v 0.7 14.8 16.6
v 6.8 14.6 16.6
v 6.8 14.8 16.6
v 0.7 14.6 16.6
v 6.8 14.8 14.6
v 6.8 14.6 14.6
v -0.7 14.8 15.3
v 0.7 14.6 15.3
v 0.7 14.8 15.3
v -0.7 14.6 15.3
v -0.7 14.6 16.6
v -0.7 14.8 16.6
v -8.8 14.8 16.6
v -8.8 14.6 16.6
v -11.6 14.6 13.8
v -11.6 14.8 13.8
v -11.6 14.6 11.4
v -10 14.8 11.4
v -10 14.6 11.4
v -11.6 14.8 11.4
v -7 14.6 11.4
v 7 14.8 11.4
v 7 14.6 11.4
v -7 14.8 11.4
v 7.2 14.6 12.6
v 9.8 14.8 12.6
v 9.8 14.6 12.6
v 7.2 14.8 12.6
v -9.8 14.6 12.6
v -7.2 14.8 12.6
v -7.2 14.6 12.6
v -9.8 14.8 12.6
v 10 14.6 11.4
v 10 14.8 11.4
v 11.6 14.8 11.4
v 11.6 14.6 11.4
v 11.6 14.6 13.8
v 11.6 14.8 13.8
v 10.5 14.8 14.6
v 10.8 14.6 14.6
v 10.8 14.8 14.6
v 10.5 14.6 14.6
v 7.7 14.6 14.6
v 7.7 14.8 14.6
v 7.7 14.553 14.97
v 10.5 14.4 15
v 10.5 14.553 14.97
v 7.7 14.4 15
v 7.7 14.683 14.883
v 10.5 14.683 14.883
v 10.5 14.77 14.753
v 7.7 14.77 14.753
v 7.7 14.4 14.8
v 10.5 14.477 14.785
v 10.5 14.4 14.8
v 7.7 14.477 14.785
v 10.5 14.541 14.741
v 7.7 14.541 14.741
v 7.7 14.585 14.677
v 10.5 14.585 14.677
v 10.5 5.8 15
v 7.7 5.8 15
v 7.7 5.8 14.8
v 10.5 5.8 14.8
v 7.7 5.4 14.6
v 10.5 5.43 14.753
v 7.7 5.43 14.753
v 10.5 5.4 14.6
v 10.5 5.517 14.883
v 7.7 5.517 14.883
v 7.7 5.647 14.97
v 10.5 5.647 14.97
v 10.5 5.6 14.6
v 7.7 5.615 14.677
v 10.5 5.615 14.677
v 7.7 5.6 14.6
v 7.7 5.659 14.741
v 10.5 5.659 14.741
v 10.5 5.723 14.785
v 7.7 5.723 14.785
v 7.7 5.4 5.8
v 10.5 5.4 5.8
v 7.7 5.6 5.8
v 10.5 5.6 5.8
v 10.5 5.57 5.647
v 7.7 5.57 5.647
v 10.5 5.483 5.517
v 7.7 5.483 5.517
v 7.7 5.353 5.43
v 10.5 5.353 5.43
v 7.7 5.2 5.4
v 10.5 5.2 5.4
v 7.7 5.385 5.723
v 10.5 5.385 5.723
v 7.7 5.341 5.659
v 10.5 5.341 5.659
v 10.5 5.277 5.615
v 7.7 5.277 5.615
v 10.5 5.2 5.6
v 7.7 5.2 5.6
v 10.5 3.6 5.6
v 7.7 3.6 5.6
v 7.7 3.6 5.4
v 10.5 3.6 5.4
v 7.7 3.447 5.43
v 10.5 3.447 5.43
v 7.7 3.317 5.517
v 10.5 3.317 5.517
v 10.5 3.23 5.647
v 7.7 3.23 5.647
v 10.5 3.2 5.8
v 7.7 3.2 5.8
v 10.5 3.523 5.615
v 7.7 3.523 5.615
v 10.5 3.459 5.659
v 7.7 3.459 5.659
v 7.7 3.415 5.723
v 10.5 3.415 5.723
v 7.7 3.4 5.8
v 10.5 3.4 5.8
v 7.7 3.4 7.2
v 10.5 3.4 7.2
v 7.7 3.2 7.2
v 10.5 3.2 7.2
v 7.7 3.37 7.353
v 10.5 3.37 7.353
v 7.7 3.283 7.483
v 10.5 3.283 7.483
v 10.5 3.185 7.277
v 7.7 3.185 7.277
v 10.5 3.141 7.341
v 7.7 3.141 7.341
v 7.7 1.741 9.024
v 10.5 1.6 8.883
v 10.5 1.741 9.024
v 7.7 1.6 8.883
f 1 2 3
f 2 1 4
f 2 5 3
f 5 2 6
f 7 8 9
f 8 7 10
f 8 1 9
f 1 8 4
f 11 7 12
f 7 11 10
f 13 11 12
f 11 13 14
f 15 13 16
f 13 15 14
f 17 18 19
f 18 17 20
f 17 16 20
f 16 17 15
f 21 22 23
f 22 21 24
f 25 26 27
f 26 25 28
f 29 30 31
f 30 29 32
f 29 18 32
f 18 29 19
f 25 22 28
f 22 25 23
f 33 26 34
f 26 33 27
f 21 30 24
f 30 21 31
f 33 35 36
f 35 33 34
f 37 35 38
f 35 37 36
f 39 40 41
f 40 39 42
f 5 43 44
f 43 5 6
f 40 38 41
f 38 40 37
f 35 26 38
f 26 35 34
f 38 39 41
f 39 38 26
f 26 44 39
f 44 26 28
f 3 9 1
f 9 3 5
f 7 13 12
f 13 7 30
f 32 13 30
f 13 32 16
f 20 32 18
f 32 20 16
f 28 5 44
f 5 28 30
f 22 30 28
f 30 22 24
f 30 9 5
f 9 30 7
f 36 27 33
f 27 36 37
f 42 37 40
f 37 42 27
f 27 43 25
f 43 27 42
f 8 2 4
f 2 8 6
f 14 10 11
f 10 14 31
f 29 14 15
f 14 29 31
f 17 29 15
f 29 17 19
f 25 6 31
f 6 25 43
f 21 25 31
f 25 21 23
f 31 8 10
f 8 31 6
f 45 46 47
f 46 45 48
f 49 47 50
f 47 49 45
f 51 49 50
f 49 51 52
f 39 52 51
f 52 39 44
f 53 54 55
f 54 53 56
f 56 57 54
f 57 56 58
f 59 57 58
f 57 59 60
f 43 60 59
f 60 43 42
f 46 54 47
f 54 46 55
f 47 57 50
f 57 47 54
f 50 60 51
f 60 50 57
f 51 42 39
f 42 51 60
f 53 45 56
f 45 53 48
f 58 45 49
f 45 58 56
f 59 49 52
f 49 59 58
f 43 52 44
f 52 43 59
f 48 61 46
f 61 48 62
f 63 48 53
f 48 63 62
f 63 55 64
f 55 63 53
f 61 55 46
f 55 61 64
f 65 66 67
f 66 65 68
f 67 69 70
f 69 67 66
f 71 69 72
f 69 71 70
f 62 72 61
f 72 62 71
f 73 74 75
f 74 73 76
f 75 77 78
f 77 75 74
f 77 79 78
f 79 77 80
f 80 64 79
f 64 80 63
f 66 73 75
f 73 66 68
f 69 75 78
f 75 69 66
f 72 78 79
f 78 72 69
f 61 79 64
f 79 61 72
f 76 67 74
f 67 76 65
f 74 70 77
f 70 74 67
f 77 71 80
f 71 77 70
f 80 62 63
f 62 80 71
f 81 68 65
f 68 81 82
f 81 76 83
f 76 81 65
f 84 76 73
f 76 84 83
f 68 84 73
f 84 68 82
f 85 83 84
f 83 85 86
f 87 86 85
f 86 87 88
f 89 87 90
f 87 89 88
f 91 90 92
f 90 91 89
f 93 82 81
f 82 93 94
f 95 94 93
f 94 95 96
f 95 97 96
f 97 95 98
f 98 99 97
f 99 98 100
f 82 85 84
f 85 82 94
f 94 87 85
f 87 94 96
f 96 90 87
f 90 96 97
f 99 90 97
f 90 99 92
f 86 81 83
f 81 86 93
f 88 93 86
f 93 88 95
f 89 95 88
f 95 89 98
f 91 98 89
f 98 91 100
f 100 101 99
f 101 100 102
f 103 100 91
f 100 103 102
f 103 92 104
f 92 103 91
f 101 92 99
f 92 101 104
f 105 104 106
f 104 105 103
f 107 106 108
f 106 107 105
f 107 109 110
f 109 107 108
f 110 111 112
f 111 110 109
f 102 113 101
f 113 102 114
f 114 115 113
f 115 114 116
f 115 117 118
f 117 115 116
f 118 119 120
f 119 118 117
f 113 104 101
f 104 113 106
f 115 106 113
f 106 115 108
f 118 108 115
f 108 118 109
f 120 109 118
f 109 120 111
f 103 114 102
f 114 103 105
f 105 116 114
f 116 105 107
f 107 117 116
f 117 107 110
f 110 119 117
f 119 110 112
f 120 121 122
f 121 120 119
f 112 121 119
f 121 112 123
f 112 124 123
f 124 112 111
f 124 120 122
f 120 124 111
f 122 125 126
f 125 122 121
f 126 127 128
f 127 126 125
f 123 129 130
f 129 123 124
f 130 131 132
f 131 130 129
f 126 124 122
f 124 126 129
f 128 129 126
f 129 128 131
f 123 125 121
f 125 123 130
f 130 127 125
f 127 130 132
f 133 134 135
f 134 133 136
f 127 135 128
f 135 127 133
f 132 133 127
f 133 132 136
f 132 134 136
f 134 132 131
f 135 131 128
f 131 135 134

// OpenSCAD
// file: ../p/1-8edge.scad
use <../lib.scad>
function ldraw_lib__1_8edge() = [
// 0 Circle 0.125
// 0 Name: 1-8edge.dat
// 0 Author: James Jessiman
// 0 !LDRAW_ORG Primitive UPDATE 2017-01
// 0 !LICENSE Licensed under CC BY 4.0 : see CAreadme.txt
// 
// 0 BFC CERTIFY CCW
  [0,"BFC","CERTIFY"],
  [0,"BFC","CCW"],
// 
// 0 !HISTORY 2007-06-22 [PTadmin] Header formatted for Contributor Agreement
// 0 !HISTORY 2008-07-01 [PTadmin] Official Update 2008-01
// 0 !HISTORY 2017-01-15 [Steffen] BFCed
// 0 !HISTORY 2017-12-30 [PTadmin] Official Update 2017-01
// 
// 
// 2 24 1 0 0 0.9239 0 0.3827
  [2,24,1,0,0,0.9239,0,0.3827],
// 2 24 0.9239 0 0.3827 0.7071 0 0.7071
  [2,24,0.9239,0,0.3827,0.7071,0,0.7071],
];
module ldraw_lib__1_8edge(step=0, col=false, unit=2/5, alt=false, line=0.2, solid=!$preview)
    makepoly(ldraw_lib__1_8edge(), step=step, col=col, unit=unit, alt=alt, line=line, solid=solid);
ldraw_lib__1_8edge(line=0.2);
// file: ../p/1-8cyli.scad
use <../lib.scad>
function ldraw_lib__1_8cyli() = [
// 0 Cylinder 0.125
// 0 Name: 1-8cyli.dat
// 0 Author: James Jessiman
// 0 !LDRAW_ORG Primitive UPDATE 2005-01
// 0 !LICENSE Licensed under CC BY 4.0 : see CAreadme.txt
// 
// 0 BFC CERTIFY CCW
  [0,"BFC","CERTIFY"],
  [0,"BFC","CCW"],
// 
// 0 !HISTORY 2002-04-25 [PTadmin] Official Update 2002-02
// 0 !HISTORY 2004-12-11 [nielsk] Recreated using Primitive Generator, Edge lines fixed, BFC changed to CCW
// 0 !HISTORY 2005-12-28 [PTadmin] Official Update 2005-01
// 0 !HISTORY 2007-06-22 [PTadmin] Header formatted for Contributor Agreement
// 0 !HISTORY 2008-07-01 [PTadmin] Official Update 2008-01
// 
// 
// 4 16 .9239 1 .3827 .9239 0 .3827 1 0 0 1 1 0
  [4,16,.9239,1,.3827,.9239,0,.3827,1,0,0,1,1,0],
// 4 16 .7071 1 .7071 .7071 0 .7071 .9239 0 .3827 .9239 1 .3827
  [4,16,.7071,1,.7071,.7071,0,.7071,.9239,0,.3827,.9239,1,.3827],
// 5 24 1 1 0 1 0 0 1 1 -.4142 .9239 1 .3827
  [5,24,1,1,0,1,0,0,1,1,-.4142,.9239,1,.3827],
// 5 24 .9239 1 .3827 .9239 0 .3827 1 1 0 .7071 1 .7071
  [5,24,.9239,1,.3827,.9239,0,.3827,1,1,0,.7071,1,.7071],
// 5 24 .7071 1 .7071 .7071 0 .7071 .9239 1 .3827 .4142 1 1
  [5,24,.7071,1,.7071,.7071,0,.7071,.9239,1,.3827,.4142,1,1],
// 0
];
module ldraw_lib__1_8cyli(step=0, col=false, unit=2/5, alt=false, line=0.2, solid=!$preview)
    makepoly(ldraw_lib__1_8cyli(), step=step, col=col, unit=unit, alt=alt, line=line, solid=solid);
ldraw_lib__1_8cyli(line=0.2);
// file: ../p/1-4edge.scad
use <../lib.scad>
function ldraw_lib__1_4edge() = [
// 0 Circle 0.25
// 0 Name: 1-4edge.dat
// 0 Author: James Jessiman
// 0 !LDRAW_ORG Primitive UPDATE 2017-01
// 0 !LICENSE Licensed under CC BY 4.0 : see CAreadme.txt
// 
// 0 BFC CERTIFY CCW
  [0,"BFC","CERTIFY"],
  [0,"BFC","CCW"],
// 
// 0 !HISTORY 2007-06-22 [PTadmin] Header formatted for Contributor Agreement
// 0 !HISTORY 2008-07-01 [PTadmin] Official Update 2008-01
// 0 !HISTORY 2017-01-15 [Steffen] BFCed
// 0 !HISTORY 2017-12-30 [PTadmin] Official Update 2017-01
// 
// 
// 2 24 1 0 0 0.9239 0 0.3827
  [2,24,1,0,0,0.9239,0,0.3827],
// 2 24 0.9239 0 0.3827 0.7071 0 0.7071
  [2,24,0.9239,0,0.3827,0.7071,0,0.7071],
// 2 24 0.7071 0 0.7071 0.3827 0 0.9239
  [2,24,0.7071,0,0.7071,0.3827,0,0.9239],
// 2 24 0.3827 0 0.9239 0 0 1
  [2,24,0.3827,0,0.9239,0,0,1],
];
module ldraw_lib__1_4edge(step=0, col=false, unit=2/5, alt=false, line=0.2, solid=!$preview)
    makepoly(ldraw_lib__1_4edge(), step=step, col=col, unit=unit, alt=alt, line=line, solid=solid);
ldraw_lib__1_4edge(line=0.2);
// file: ../p/1-4cyli.scad
use <../lib.scad>
function ldraw_lib__1_4cyli() = [
// 0 Cylinder 0.25
// 0 Name: 1-4cyli.dat
// 0 Author: James Jessiman
// 0 !LDRAW_ORG Primitive UPDATE 2012-01
// 0 !LICENSE Licensed under CC BY 4.0 : see CAreadme.txt
// 
// 0 BFC CERTIFY CCW
  [0,"BFC","CERTIFY"],
  [0,"BFC","CCW"],
// 
// 0 !HISTORY 2002-03-23 [sbliss] Added BFC statement.
// 0 !HISTORY 2002-04-25 [PTadmin] Official Update 2002-02
// 0 !HISTORY 2007-06-22 [PTadmin] Header formatted for Contributor Agreement
// 0 !HISTORY 2008-07-01 [PTadmin] Official Update 2008-01
// 0 !HISTORY 2012-02-16 [Philo] Changed to CCW
// 0 !HISTORY 2012-03-30 [PTadmin] Official Update 2012-01
// 
// 
// 4 16 1 1 0 0.9239 1 0.3827 0.9239 0 0.3827 1 0 0
  [4,16,1,1,0,0.9239,1,0.3827,0.9239,0,0.3827,1,0,0],
// 5 24 1 0 0 1 1 0 0.9239 0 0.3827 1 0 -1
  [5,24,1,0,0,1,1,0,0.9239,0,0.3827,1,0,-1],
// 4 16 0.9239 1 0.3827 0.7071 1 0.7071 0.7071 0 0.7071 0.9239 0 0.3827
  [4,16,0.9239,1,0.3827,0.7071,1,0.7071,0.7071,0,0.7071,0.9239,0,0.3827],
// 5 24 0.9239 0 0.3827 0.9239 1 0.3827 0.7071 0 0.7071 1 0 0
  [5,24,0.9239,0,0.3827,0.9239,1,0.3827,0.7071,0,0.7071,1,0,0],
// 4 16 0.7071 1 0.7071 0.3827 1 0.9239 0.3827 0 0.9239 0.7071 0 0.7071
  [4,16,0.7071,1,0.7071,0.3827,1,0.9239,0.3827,0,0.9239,0.7071,0,0.7071],
// 5 24 0.7071 0 0.7071 0.7071 1 0.7071 0.3827 0 0.9239 0.9239 0 0.3827
  [5,24,0.7071,0,0.7071,0.7071,1,0.7071,0.3827,0,0.9239,0.9239,0,0.3827],
// 4 16 0.3827 1 0.9239 0 1 1 0 0 1 0.3827 0 0.9239
  [4,16,0.3827,1,0.9239,0,1,1,0,0,1,0.3827,0,0.9239],
// 5 24 0.3827 0 0.9239 0.3827 1 0.9239 0 0 1 0.7071 0 0.7071
  [5,24,0.3827,0,0.9239,0.3827,1,0.9239,0,0,1,0.7071,0,0.7071],
// 5 24 0 0 1 0 1 1 0.3827 0 0.9239 -1 0 1
  [5,24,0,0,1,0,1,1,0.3827,0,0.9239,-1,0,1],
];
module ldraw_lib__1_4cyli(step=0, col=false, unit=2/5, alt=false, line=0.2, solid=!$preview)
    makepoly(ldraw_lib__1_4cyli(), step=step, col=col, unit=unit, alt=alt, line=line, solid=solid);
ldraw_lib__1_4cyli(line=0.2);
// file: ../p/rect.scad
use <../lib.scad>
function ldraw_lib__rect() = [
// 0 Rectangle
// 0 Name: rect.dat
// 0 Author: James Jessiman
// 0 !LDRAW_ORG Primitive UPDATE 2010-01
// 0 !LICENSE Licensed under CC BY 4.0 : see CAreadme.txt
// 
// 0 BFC CERTIFY CCW
  [0,"BFC","CERTIFY"],
  [0,"BFC","CCW"],
// 
// 0 !HISTORY 2002-04-05 [hafhead] Added BFC statement
// 0 !HISTORY 2002-04-25 [PTadmin] Official Update 2002-02
// 0 !HISTORY 2007-06-24 [PTadmin] Header formatted for Contributor Agreement
// 0 !HISTORY 2008-07-01 [PTadmin] Official Update 2008-01
// 0 !HISTORY 2010-01-17 [mikeheide] changed winding to CCW
// 0 !HISTORY 2010-04-05 [PTadmin] Official Update 2010-01
// 
// 
// 2 24 1 0 1 -1 0 1
  [2,24,1,0,1,-1,0,1],
// 2 24 -1 0 1 -1 0 -1
  [2,24,-1,0,1,-1,0,-1],
// 2 24 -1 0 -1 1 0 -1
  [2,24,-1,0,-1,1,0,-1],
// 2 24 1 0 -1 1 0 1
  [2,24,1,0,-1,1,0,1],
// 4 16 -1 0 1 -1 0 -1 1 0 -1 1 0 1
  [4,16,-1,0,1,-1,0,-1,1,0,-1,1,0,1],
// 0
];
module ldraw_lib__rect(step=0, col=false, unit=2/5, alt=false, line=0.2, solid=!$preview)
    makepoly(ldraw_lib__rect(), step=step, col=col, unit=unit, alt=alt, line=line, solid=solid);
ldraw_lib__rect(line=0.2);
// file: ../p/box5-4a.scad
use <../lib.scad>
function ldraw_lib__box5_4a() = [
// 0 Box with  5 Faces without  4 Adjacent Edges
// 0 Name: box5-4a.dat
// 0 Author: Willy Tschager [Holly-Wood]
// 0 !LDRAW_ORG Primitive UPDATE 2024-01
// 0 !LICENSE Licensed under CC BY 4.0 : see CAreadme.txt
// 
// 0 BFC CERTIFY CCW
  [0,"BFC","CERTIFY"],
  [0,"BFC","CCW"],
// 
// 0 !HISTORY 2009-05-02 [PTadmin] Official Update 2009-01
// 0 !HISTORY 2024-01-03 [Holly-Wood] Complete re-write, original by guyvivan
// 0 !HISTORY 2024-01-29 [OrionP] Official Update 2024-01
// 
// 2 24 -1 1 -1 -1 1 1
  [2,24,-1,1,-1,-1,1,1],
// 2 24 1 1 1 1 1 -1
  [2,24,1,1,1,1,1,-1],
// 2 24 -1 1 1 1 1 1
  [2,24,-1,1,1,1,1,1],
// 2 24 -1 1 -1 1 1 -1
  [2,24,-1,1,-1,1,1,-1],
// 4 16 1 1 1 1 1 -1 -1 1 -1 -1 1 1
  [4,16,1,1,1,1,1,-1,-1,1,-1,-1,1,1],
// 
// 2 24 -1 0 -1 -1 1 -1
  [2,24,-1,0,-1,-1,1,-1],
// 2 24 -1 1 1 -1 0 1
  [2,24,-1,1,1,-1,0,1],
// 4 16 -1 1 1 -1 1 -1 -1 0 -1 -1 0 1
  [4,16,-1,1,1,-1,1,-1,-1,0,-1,-1,0,1],
// 
// 2 24 1 0 -1 1 1 -1
  [2,24,1,0,-1,1,1,-1],
// 2 24 1 1 1 1 0 1
  [2,24,1,1,1,1,0,1],
// 4 16 1 1 -1 1 1 1 1 0 1 1 0 -1
  [4,16,1,1,-1,1,1,1,1,0,1,1,0,-1],
// 
// 4 16 1 1 1 -1 1 1 -1 0 1 1 0 1
  [4,16,1,1,1,-1,1,1,-1,0,1,1,0,1],
// 4 16 -1 1 -1 1 1 -1 1 0 -1 -1 0 -1
  [4,16,-1,1,-1,1,1,-1,1,0,-1,-1,0,-1],
];
module ldraw_lib__box5_4a(step=0, col=false, unit=2/5, alt=false, line=0.2, solid=!$preview)
    makepoly(ldraw_lib__box5_4a(), step=step, col=col, unit=unit, alt=alt, line=line, solid=solid);
ldraw_lib__box5_4a(line=0.2);
// file: ../p/box4o8a.scad
use <../lib.scad>
function ldraw_lib__box4o8a() = [
// 0 Box with 4 Faces (2 Parallel Pairs) without Top and Bottom Edges
// 0 Name: box4o8a.dat
// 0 Author: Steffen [Steffen]
// 0 !LDRAW_ORG Primitive UPDATE 2012-01
// 0 !LICENSE Licensed under CC BY 4.0 : see CAreadme.txt
// 
// 0 BFC CERTIFY CCW
  [0,"BFC","CERTIFY"],
  [0,"BFC","CCW"],
// 
// 0 !HISTORY 2004-04-22 [PTadmin] Official Update 2004-02
// 0 !HISTORY 2007-06-24 [PTadmin] Header formatted for Contributor Agreement
// 0 !HISTORY 2008-07-01 [PTadmin] Official Update 2008-01
// 0 !HISTORY 2012-02-16 [Philo] Changed to CCW
// 0 !HISTORY 2012-03-30 [PTadmin] Official Update 2012-01
// 
// 
// 2 24 1 0 1 1 1 1
  [2,24,1,0,1,1,1,1],
// 2 24 -1 0 1 -1 1 1
  [2,24,-1,0,1,-1,1,1],
// 2 24 1 0 -1 1 1 -1
  [2,24,1,0,-1,1,1,-1],
// 2 24 -1 0 -1 -1 1 -1
  [2,24,-1,0,-1,-1,1,-1],
// 4 16 -1 1 1 -1 0 1 1 0 1 1 1 1
  [4,16,-1,1,1,-1,0,1,1,0,1,1,1,1],
// 4 16 -1 1 -1 -1 0 -1 -1 0 1 -1 1 1
  [4,16,-1,1,-1,-1,0,-1,-1,0,1,-1,1,1],
// 4 16 1 1 -1 1 0 -1 -1 0 -1 -1 1 -1
  [4,16,1,1,-1,1,0,-1,-1,0,-1,-1,1,-1],
// 4 16 1 1 1 1 0 1 1 0 -1 1 1 -1
  [4,16,1,1,1,1,0,1,1,0,-1,1,1,-1],
];
module ldraw_lib__box4o8a(step=0, col=false, unit=2/5, alt=false, line=0.2, solid=!$preview)
    makepoly(ldraw_lib__box4o8a(), step=step, col=col, unit=unit, alt=alt, line=line, solid=solid);
ldraw_lib__box4o8a(line=0.2);
// file: ../p/box3u2p.scad
use <../lib.scad>
function ldraw_lib__box3u2p() = [
// 0 Box with 3 Faces without 2 Parallel Edges
// 0 Name: box3u2p.dat
// 0 Author: Niels Karsdorp [nielsk]
// 0 !LDRAW_ORG Primitive UPDATE 2012-01
// 0 !LICENSE Licensed under CC BY 4.0 : see CAreadme.txt
// 
// 0 BFC CERTIFY CCW
  [0,"BFC","CERTIFY"],
  [0,"BFC","CCW"],
// 
// 0 !HISTORY 2003-03-12 [PTadmin] Official Update 2003-01
// 0 !HISTORY 2007-06-24 [PTadmin] Header formatted for Contributor Agreement
// 0 !HISTORY 2008-07-01 [PTadmin] Official Update 2008-01
// 0 !HISTORY 2012-02-16 [Philo] Changed to CCW
// 0 !HISTORY 2012-03-30 [PTadmin] Official Update 2012-01
// 
// 
// 2 24 1 1 1 -1 1 1
  [2,24,1,1,1,-1,1,1],
// 2 24 -1 1 -1 1 1 -1
  [2,24,-1,1,-1,1,1,-1],
// 2 24 1 0 1 -1 0 1
  [2,24,1,0,1,-1,0,1],
// 2 24 -1 0 -1 1 0 -1
  [2,24,-1,0,-1,1,0,-1],
// 2 24 1 1 1 1 1 -1
  [2,24,1,1,1,1,1,-1],
// 2 24 -1 1 1 -1 1 -1
  [2,24,-1,1,1,-1,1,-1],
// 2 24 1 1 1 1 0 1
  [2,24,1,1,1,1,0,1],
// 2 24 1 1 -1 1 0 -1
  [2,24,1,1,-1,1,0,-1],
// 2 24 -1 1 1 -1 0 1
  [2,24,-1,1,1,-1,0,1],
// 2 24 -1 1 -1 -1 0 -1
  [2,24,-1,1,-1,-1,0,-1],
// 4 16 -1 1 -1 -1 1 1 1 1 1 1 1 -1
  [4,16,-1,1,-1,-1,1,1,1,1,1,1,1,-1],
// 4 16 -1 1 1 -1 0 1 1 0 1 1 1 1
  [4,16,-1,1,1,-1,0,1,1,0,1,1,1,1],
// 4 16 1 1 -1 1 0 -1 -1 0 -1 -1 1 -1
  [4,16,1,1,-1,1,0,-1,-1,0,-1,-1,1,-1],
];
module ldraw_lib__box3u2p(step=0, col=false, unit=2/5, alt=false, line=0.2, solid=!$preview)
    makepoly(ldraw_lib__box3u2p(), step=step, col=col, unit=unit, alt=alt, line=line, solid=solid);
ldraw_lib__box3u2p(line=0.2);
// file: ../p/box2-7.scad
use <../lib.scad>
function ldraw_lib__box2_7() = [
// 0 Box with  2 Faces without  7 Edges
// 0 Name: box2-7.dat
// 0 Author: Willy Tschager [Holly-Wood]
// 0 !LDRAW_ORG Primitive UPDATE 2024-01
// 0 !LICENSE Licensed under CC BY 4.0 : see CAreadme.txt
// 
// 0 BFC CERTIFY CCW
  [0,"BFC","CERTIFY"],
  [0,"BFC","CCW"],
// 
// 0 !HISTORY 2009-05-02 [PTadmin] Official Update 2009-01
// 0 !HISTORY 2024-01-02 [Holly-Wood] Complete re-write, original by guyvivan
// 0 !HISTORY 2024-01-29 [OrionP] Official Update 2024-01
// 
// 2 24 -1 1 -1 -1 1 1
  [2,24,-1,1,-1,-1,1,1],
// 2 24 1 1 1 1 1 -1
  [2,24,1,1,1,1,1,-1],
// 4 16 -1 1 1 1 1 1 1 1 -1 -1 1 -1
  [4,16,-1,1,1,1,1,1,1,1,-1,-1,1,-1],
// 
// 2 24 -1 1 1 -1 -1 1
  [2,24,-1,1,1,-1,-1,1],
// 2 24 1 1 1 1 -1 1
  [2,24,1,1,1,1,-1,1],
// 4 16 1 -1 1 1 1 1 -1 1 1 -1 -1 1
  [4,16,1,-1,1,1,1,1,-1,1,1,-1,-1,1],
// 
// 2 24 -1 1 1 1 1 1
  [2,24,-1,1,1,1,1,1],
];
module ldraw_lib__box2_7(step=0, col=false, unit=2/5, alt=false, line=0.2, solid=!$preview)
    makepoly(ldraw_lib__box2_7(), step=step, col=col, unit=unit, alt=alt, line=line, solid=solid);
ldraw_lib__box2_7(line=0.2);
// file: ../p/box2-5.scad
use <../lib.scad>
function ldraw_lib__box2_5() = [
// 0 Box with 2 Faces without 5 Edges
// 0 Name: box2-5.dat
// 0 Author: Steffen [Steffen]
// 0 !LDRAW_ORG Primitive UPDATE 2003-03
// 0 !LICENSE Licensed under CC BY 4.0 : see CAreadme.txt
// 
// 0 BFC CERTIFY CCW
  [0,"BFC","CERTIFY"],
  [0,"BFC","CCW"],
// 
// 0 !HISTORY 2003-12-19 [PTadmin] Official Update 2003-03
// 0 !HISTORY 2007-06-24 [PTadmin] Header formatted for Contributor Agreement
// 0 !HISTORY 2008-07-01 [PTadmin] Official Update 2008-01
// 
// 
// 2 24 1 1 1 -1 1 1
  [2,24,1,1,1,-1,1,1],
// 2 24 1 1 -1 -1 1 -1
  [2,24,1,1,-1,-1,1,-1],
// 2 24 1 -1 1 -1 -1 1
  [2,24,1,-1,1,-1,-1,1],
// 2 24 -1 -1 1 -1 1 1
  [2,24,-1,-1,1,-1,1,1],
// 2 24 1 -1 1 1 1 1
  [2,24,1,-1,1,1,1,1],
// 2 24 -1 1 -1 -1 1 1
  [2,24,-1,1,-1,-1,1,1],
// 2 24 1 1 -1 1 1 1
  [2,24,1,1,-1,1,1,1],
// 4 16 1 1 1 1 1 -1 -1 1 -1 -1 1 1
  [4,16,1,1,1,1,1,-1,-1,1,-1,-1,1,1],
// 4 16 1 1 1 -1 1 1 -1 -1 1 1 -1 1
  [4,16,1,1,1,-1,1,1,-1,-1,1,1,-1,1],
// 0
];
module ldraw_lib__box2_5(step=0, col=false, unit=2/5, alt=false, line=0.2, solid=!$preview)
    makepoly(ldraw_lib__box2_5(), step=step, col=col, unit=unit, alt=alt, line=line, solid=solid);
ldraw_lib__box2_5(line=0.2);
// file: ../p/1-8ring1.scad
use <../lib.scad>
function ldraw_lib__1_8ring1() = [
// 0 Ring  1 x 0.125
// 0 Name: 1-8ring1.dat
// 0 Author: Willy Tschager [Holly-Wood]
// 0 !LDRAW_ORG Primitive UPDATE 2024-01
// 0 !LICENSE Licensed under CC BY 4.0 : see CAreadme.txt
// 
// 0 BFC CERTIFY CCW
  [0,"BFC","CERTIFY"],
  [0,"BFC","CCW"],
// 
// 0 !HISTORY 2002-12-27 [sbliss] Updated for BFC compliance
// 0 !HISTORY 2003-12-19 [PTadmin] Official Update 2003-03
// 0 !HISTORY 2007-06-22 [PTadmin] Header formatted for Contributor Agreement
// 0 !HISTORY 2008-07-01 [PTadmin] Official Update 2008-01
// 0 !HISTORY 2024-01-18 [Holly-Wood] Complete regeneration, original by bbroich
// 0 !HISTORY 2024-01-29 [OrionP] Official Update 2024-01
// 
// 4 16 2 0 0 1.8478 0 0.7654 0.9239 0 0.3827 1 0 0
  [4,16,2,0,0,1.8478,0,0.7654,0.9239,0,0.3827,1,0,0],
// 4 16 1.8478 0 0.7654 1.4142 0 1.4142 0.7071 0 0.7071 0.9239 0 0.3827
  [4,16,1.8478,0,0.7654,1.4142,0,1.4142,0.7071,0,0.7071,0.9239,0,0.3827],
// 0 // Build by LDPartEditor (PrimGen 2.X)
];
module ldraw_lib__1_8ring1(step=0, col=false, unit=2/5, alt=false, line=0.2, solid=!$preview)
    makepoly(ldraw_lib__1_8ring1(), step=step, col=col, unit=unit, alt=alt, line=line, solid=solid);
ldraw_lib__1_8ring1(line=0.2);
// file: ../p/1-8cylo.scad
use <../lib.scad>
use <1-8cyli.scad>
use <1-8edge.scad>
function ldraw_lib__1_8cylo() = [
// 0 Cylinder Open 0.125
// 0 Name: 1-8cylo.dat
// 0 Author: Tim Gould [timgould]
// 0 !LDRAW_ORG Primitive UPDATE 2012-03
// 0 !LICENSE Licensed under CC BY 4.0 : see CAreadme.txt
// 
// 0 BFC CERTIFY CCW
  [0,"BFC","CERTIFY"],
  [0,"BFC","CCW"],
// 
// 0 !HISTORY 2012-12-28 [PTadmin] Official Update 2012-03
// 
// 
// 1 16 0 0 0 1 0 0 0 1 0 0 0 1 1-8edge.dat
  [1,16,0,0,0,1,0,0,0,1,0,0,0,1, ldraw_lib__1_8edge()],
// 1 16 0 1 0 1 0 0 0 1 0 0 0 1 1-8edge.dat
  [1,16,0,1,0,1,0,0,0,1,0,0,0,1, ldraw_lib__1_8edge()],
// 1 16 0 0 0 1 0 0 0 1 0 0 0 1 1-8cyli.dat
  [1,16,0,0,0,1,0,0,0,1,0,0,0,1, ldraw_lib__1_8cyli()],
];
module ldraw_lib__1_8cylo(step=0, col=false, unit=2/5, alt=false, line=0.2, solid=!$preview)
    makepoly(ldraw_lib__1_8cylo(), step=step, col=col, unit=unit, alt=alt, line=line, solid=solid);
ldraw_lib__1_8cylo(line=0.2);
// file: ../p/1-4ring1.scad
use <../lib.scad>
function ldraw_lib__1_4ring1() = [
// 0 Ring  1 x 0.25
// 0 Name: 1-4ring1.dat
// 0 Author: Chris Dee [cwdee]
// 0 !LDRAW_ORG Primitive UPDATE 2012-01
// 0 !LICENSE Licensed under CC BY 4.0 : see CAreadme.txt
// 
// 0 BFC CERTIFY CCW
  [0,"BFC","CERTIFY"],
  [0,"BFC","CCW"],
// 
// 0 !HISTORY 2000-05-07 [PTadmin] Official Update 2000-01
// 0 !HISTORY 2002-11-22 [hafhead] Added BFC statement
// 0 !HISTORY 2002-11-30 [PTadmin] Official Update 2002-05
// 0 !HISTORY 2007-06-22 [PTadmin] Header formatted for Contributor Agreement
// 0 !HISTORY 2008-07-01 [PTadmin] Official Update 2008-01
// 0 !HISTORY 2012-02-16 [Philo] Changed to CCW
// 0 !HISTORY 2012-03-30 [PTadmin] Official Update 2012-01
// 
// 
// 4 16 2 0 0 1.8478 0 0.7654 0.9239 0 0.3827 1 0 0
  [4,16,2,0,0,1.8478,0,0.7654,0.9239,0,0.3827,1,0,0],
// 4 16 1.8478 0 0.7654 1.4142 0 1.4142 0.7071 0 0.7071 0.9239 0 0.3827
  [4,16,1.8478,0,0.7654,1.4142,0,1.4142,0.7071,0,0.7071,0.9239,0,0.3827],
// 4 16 1.4142 0 1.4142 0.7654 0 1.8478 0.3827 0 0.9239 0.7071 0 0.7071
  [4,16,1.4142,0,1.4142,0.7654,0,1.8478,0.3827,0,0.9239,0.7071,0,0.7071],
// 4 16 0.7654 0 1.8478 0 0 2 0 0 1 0.3827 0 0.9239
  [4,16,0.7654,0,1.8478,0,0,2,0,0,1,0.3827,0,0.9239],
];
module ldraw_lib__1_4ring1(step=0, col=false, unit=2/5, alt=false, line=0.2, solid=!$preview)
    makepoly(ldraw_lib__1_4ring1(), step=step, col=col, unit=unit, alt=alt, line=line, solid=solid);
ldraw_lib__1_4ring1(line=0.2);
// file: ../p/1-4cylo.scad
use <../lib.scad>
use <1-4cyli.scad>
use <1-4edge.scad>
function ldraw_lib__1_4cylo() = [
// 0 Cylinder Open 0.25
// 0 Name: 1-4cylo.dat
// 0 Author: Max Martin Richter [MMR1988]
// 0 !LDRAW_ORG Primitive UPDATE 2010-03
// 0 !LICENSE Licensed under CC BY 4.0 : see CAreadme.txt
// 
// 0 BFC CERTIFY CCW
  [0,"BFC","CERTIFY"],
  [0,"BFC","CCW"],
// 
// 0 !HISTORY 2010-12-31 [PTadmin] Official Update 2010-03
// 
// 
// 1 16 0 0 0 1 0 0 0 1 0 0 0 1 1-4edge.dat
  [1,16,0,0,0,1,0,0,0,1,0,0,0,1, ldraw_lib__1_4edge()],
// 1 16 0 1 0 1 0 0 0 1 0 0 0 1 1-4edge.dat
  [1,16,0,1,0,1,0,0,0,1,0,0,0,1, ldraw_lib__1_4edge()],
// 1 16 0 0 0 1 0 0 0 1 0 0 0 1 1-4cyli.dat
  [1,16,0,0,0,1,0,0,0,1,0,0,0,1, ldraw_lib__1_4cyli()],
];
module ldraw_lib__1_4cylo(step=0, col=false, unit=2/5, alt=false, line=0.2, solid=!$preview)
    makepoly(ldraw_lib__1_4cylo(), step=step, col=col, unit=unit, alt=alt, line=line, solid=solid);
ldraw_lib__1_4cylo(line=0.2);
// main file
use <../lib.scad>
use <../p/1-4cylo.scad>
use <../p/1-4ring1.scad>
use <../p/1-8cylo.scad>
use <../p/1-8ring1.scad>
use <../p/box2-5.scad>
use <../p/box2-7.scad>
use <../p/box3u2p.scad>
use <../p/box4o8a.scad>
use <../p/box5-4a.scad>
use <../p/rect.scad>
function ldraw_lib__u9575() = [
// 0 ~Electric 9V Battery Box  4 x 14 x  4 - Buttons - Contact, Positive
// 0 Name: u9575.dat
// 0 Author: Gerald Lasser [GeraldLasser]
// 0 !LDRAW_ORG Part UPDATE 2024-08
// 0 !LICENSE Licensed under CC BY 4.0 : see CAreadme.txt
// 
// 0 BFC CERTIFY CCW
  [0,"BFC","CERTIFY"],
  [0,"BFC","CCW"],
// 
// 0 !HISTORY 2024-09-30 [OrionP] Official Update 2024-08
// 
// 1 16 9.375 -39 36.75 0 0 7.625 0 -2.5 0 -.25 0 0 box2-7.dat
  [1,16,9.375,-39,36.75,0,0,7.625,0,-2.5,0,-.25,0,0, ldraw_lib__box2_7()],
// 0 BFC INVERTNEXT
  [0,"BFC","INVERTNEXT"],
// 1 16 0 -41.5 36.75 0 0 1.75 0 3.25 0 -.25 0 0 box3u2p.dat
  [1,16,0,-41.5,36.75,0,0,1.75,0,3.25,0,-.25,0,0, ldraw_lib__box3u2p()],
// 1 16 -15.375 -38 36.75 0 3.5 -10.125 0 -3.5 0 -.25 0 0 box2-7.dat
  [1,16,-15.375,-38,36.75,0,3.5,-10.125,0,-3.5,0,-.25,0,0, ldraw_lib__box2_7()],
// 1 16 -27 -31.5 36.75 0 0 -2 0 3 0 -.25 0 0 box2-5.dat
  [1,16,-27,-31.5,36.75,0,0,-2,0,3,0,-.25,0,0, ldraw_lib__box2_5()],
// 1 16 0 -28.5 36.75 -17.5 0 0 0 -1 0 0 0 .25 rect.dat
  [1,16,0,-28.5,36.75,-17.5,0,0,0,-1,0,0,0,.25, ldraw_lib__rect()],
// 1 16 21.25 -31.5 36.75 -3.25 0 0 0 -1 0 0 0 .25 rect.dat
  [1,16,21.25,-31.5,36.75,-3.25,0,0,0,-1,0,0,0,.25, ldraw_lib__rect()],
// 1 16 -21.25 -31.5 36.75 0 0 -3.25 0 -1 0 -.25 0 0 rect.dat
  [1,16,-21.25,-31.5,36.75,0,0,-3.25,0,-1,0,-.25,0,0, ldraw_lib__rect()],
// 4 16 -24.5 -31.5 37 -24.5 -31.5 36.5 -25 -28.5 36.5 -25 -28.5 37
  [4,16,-24.5,-31.5,37,-24.5,-31.5,36.5,-25,-28.5,36.5,-25,-28.5,37],
// 4 16 18 -31.5 36.5 17.5 -28.5 36.5 17.5 -28.5 37 18 -31.5 37
  [4,16,18,-31.5,36.5,17.5,-28.5,36.5,17.5,-28.5,37,18,-31.5,37],
// 4 16 25 -28.5 36.5 24.5 -31.5 36.5 24.5 -31.5 37 25 -28.5 37
  [4,16,25,-28.5,36.5,24.5,-31.5,36.5,24.5,-31.5,37,25,-28.5,37],
// 4 16 -17.5 -28.5 36.5 -18 -31.5 36.5 -18 -31.5 37 -17.5 -28.5 37
  [4,16,-17.5,-28.5,36.5,-18,-31.5,36.5,-18,-31.5,37,-17.5,-28.5,37],
// 2 24 24.5 -31.5 37 25 -28.5 37
  [2,24,24.5,-31.5,37,25,-28.5,37],
// 2 24 17.5 -28.5 37 18 -31.5 37
  [2,24,17.5,-28.5,37,18,-31.5,37],
// 2 24 -18 -31.5 37 -17.5 -28.5 37
  [2,24,-18,-31.5,37,-17.5,-28.5,37],
// 2 24 24.5 -31.5 36.5 25 -28.5 36.5
  [2,24,24.5,-31.5,36.5,25,-28.5,36.5],
// 2 24 17.5 -28.5 36.5 18 -31.5 36.5
  [2,24,17.5,-28.5,36.5,18,-31.5,36.5],
// 2 24 -18 -31.5 36.5 -17.5 -28.5 36.5
  [2,24,-18,-31.5,36.5,-17.5,-28.5,36.5],
// 2 24 -25 -28.5 37 -24.5 -31.5 37
  [2,24,-25,-28.5,37,-24.5,-31.5,37],
// 2 24 -25 -28.5 36.5 -24.5 -31.5 36.5
  [2,24,-25,-28.5,36.5,-24.5,-31.5,36.5],
// 1 16 27 -31.5 36.75 0 0 2 0 3 0 -.25 0 0 box2-5.dat
  [1,16,27,-31.5,36.75,0,0,2,0,3,0,-.25,0,0, ldraw_lib__box2_5()],
// 1 16 26.625 -36.5 36.75 .375 0 0 0 1 0 0 0 .25 rect.dat
  [1,16,26.625,-36.5,36.75,.375,0,0,0,1,0,0,0,.25, ldraw_lib__rect()],
// 1 16 18.125 -36.5 36.75 1.125 0 0 0 1 0 0 0 .25 rect.dat
  [1,16,18.125,-36.5,36.75,1.125,0,0,0,1,0,0,0,.25, ldraw_lib__rect()],
// 4 16 27 -36.5 37 27 -36.5 36.5 29 -34.5 36.5 29 -34.5 37
  [4,16,27,-36.5,37,27,-36.5,36.5,29,-34.5,36.5,29,-34.5,37],
// 2 24 29 -34.5 37 27 -36.5 37
  [2,24,29,-34.5,37,27,-36.5,37],
// 2 24 27 -36.5 36.5 29 -34.5 36.5
  [2,24,27,-36.5,36.5,29,-34.5,36.5],
// 
// 4 16 29 -34.5 37 29 -28.5 37 25 -28.5 37 24.5 -31.5 37
  [4,16,29,-34.5,37,29,-28.5,37,25,-28.5,37,24.5,-31.5,37],
// 4 16 27 -36.5 37 29 -34.5 37 24.5 -31.5 37 26.25 -36.5 37
  [4,16,27,-36.5,37,29,-34.5,37,24.5,-31.5,37,26.25,-36.5,37],
// 4 16 19.25 -36.5 37 26.25 -36.5 37 24.5 -31.5 37 18 -31.5 37
  [4,16,19.25,-36.5,37,26.25,-36.5,37,24.5,-31.5,37,18,-31.5,37],
// 4 16 1.75 -38.25 37 1.75 -41.5 37 17 -41.5 37 17 -36.5 37
  [4,16,1.75,-38.25,37,1.75,-41.5,37,17,-41.5,37,17,-36.5,37],
// 4 16 -1.75 -38.25 37 -18 -31.5 37 -22 -41.5 37 -1.75 -41.5 37
  [4,16,-1.75,-38.25,37,-18,-31.5,37,-22,-41.5,37,-1.75,-41.5,37],
// 4 16 -22 -41.5 37 -18 -31.5 37 -24.5 -31.5 37 -29 -34.5 37
  [4,16,-22,-41.5,37,-18,-31.5,37,-24.5,-31.5,37,-29,-34.5,37],
// 4 16 -29 -28.5 37 -29 -34.5 37 -24.5 -31.5 37 -25 -28.5 37
  [4,16,-29,-28.5,37,-29,-34.5,37,-24.5,-31.5,37,-25,-28.5,37],
// 4 16 18 -31.5 37 -18 -31.5 37 17 -36.5 37 19.25 -36.5 37
  [4,16,18,-31.5,37,-18,-31.5,37,17,-36.5,37,19.25,-36.5,37],
// 4 16 17.5 -28.5 37 -17.5 -28.5 37 -18 -31.5 37 18 -31.5 37
  [4,16,17.5,-28.5,37,-17.5,-28.5,37,-18,-31.5,37,18,-31.5,37],
// 4 16 -1.75 -38.25 37 1.75 -38.25 37 17 -36.5 37 -18 -31.5 37
  [4,16,-1.75,-38.25,37,1.75,-38.25,37,17,-36.5,37,-18,-31.5,37],
// 
// 4 16 25 -28.5 36.5 29 -28.5 36.5 29 -34.5 36.5 24.5 -31.5 36.5
  [4,16,25,-28.5,36.5,29,-28.5,36.5,29,-34.5,36.5,24.5,-31.5,36.5],
// 4 16 24.5 -31.5 36.5 29 -34.5 36.5 27 -36.5 36.5 26.25 -36.5 36.5
  [4,16,24.5,-31.5,36.5,29,-34.5,36.5,27,-36.5,36.5,26.25,-36.5,36.5],
// 4 16 24.5 -31.5 36.5 26.25 -36.5 36.5 19.25 -36.5 36.5 18 -31.5 36.5
  [4,16,24.5,-31.5,36.5,26.25,-36.5,36.5,19.25,-36.5,36.5,18,-31.5,36.5],
// 4 16 17 -41.5 36.5 1.75 -41.5 36.5 1.75 -38.25 36.5 17 -36.5 36.5
  [4,16,17,-41.5,36.5,1.75,-41.5,36.5,1.75,-38.25,36.5,17,-36.5,36.5],
// 4 16 -22 -41.5 36.5 -18 -31.5 36.5 -1.75 -38.25 36.5 -1.75 -41.5 36.5
  [4,16,-22,-41.5,36.5,-18,-31.5,36.5,-1.75,-38.25,36.5,-1.75,-41.5,36.5],
// 4 16 -24.5 -31.5 36.5 -18 -31.5 36.5 -22 -41.5 36.5 -29 -34.5 36.5
  [4,16,-24.5,-31.5,36.5,-18,-31.5,36.5,-22,-41.5,36.5,-29,-34.5,36.5],
// 4 16 -24.5 -31.5 36.5 -29 -34.5 36.5 -29 -28.5 36.5 -25 -28.5 36.5
  [4,16,-24.5,-31.5,36.5,-29,-34.5,36.5,-29,-28.5,36.5,-25,-28.5,36.5],
// 4 16 17 -36.5 36.5 -18 -31.5 36.5 18 -31.5 36.5 19.25 -36.5 36.5
  [4,16,17,-36.5,36.5,-18,-31.5,36.5,18,-31.5,36.5,19.25,-36.5,36.5],
// 4 16 -18 -31.5 36.5 -17.5 -28.5 36.5 17.5 -28.5 36.5 18 -31.5 36.5
  [4,16,-18,-31.5,36.5,-17.5,-28.5,36.5,17.5,-28.5,36.5,18,-31.5,36.5],
// 4 16 17 -36.5 36.5 1.75 -38.25 36.5 -1.75 -38.25 36.5 -18 -31.5 36.5
  [4,16,17,-36.5,36.5,1.75,-38.25,36.5,-1.75,-38.25,36.5,-18,-31.5,36.5],
// 
// 0 // Curved Part
// 1 16 26.25 -36.5 36 0 -7 0 -1 0 0 0 0 1 1-4cylo.dat
  [1,16,26.25,-36.5,36,0,-7,0,-1,0,0,0,0,1, ldraw_lib__1_4cylo()],
// 0 BFC INVERTNEXT
  [0,"BFC","INVERTNEXT"],
// 1 16 26.25 -36.5 36 0 -7 0 -.5 0 0 0 0 .5 1-4cylo.dat
  [1,16,26.25,-36.5,36,0,-7,0,-.5,0,0,0,0,.5, ldraw_lib__1_4cylo()],
// 1 16 26.25 -36.5 36 0 -1 0 -.5 0 0 0 0 .5 1-4ring1.dat
  [1,16,26.25,-36.5,36,0,-1,0,-.5,0,0,0,0,.5, ldraw_lib__1_4ring1()],
// 1 16 19.25 -36.5 36 0 1 0 -.5 0 0 0 0 .5 1-4ring1.dat
  [1,16,19.25,-36.5,36,0,1,0,-.5,0,0,0,0,.5, ldraw_lib__1_4ring1()],
// 1 16 22.75 -37.25 36 3.5 0 0 0 0 -.25 0 -21.5 0 box4o8a.dat
  [1,16,22.75,-37.25,36,3.5,0,0,0,0,-.25,0,-21.5,0, ldraw_lib__box4o8a()],
// 1 16 26.25 -36.5 14.5 0 -7 0 0 0 -1 -1 0 0 1-4cylo.dat
  [1,16,26.25,-36.5,14.5,0,-7,0,0,0,-1,-1,0,0, ldraw_lib__1_4cylo()],
// 0 BFC INVERTNEXT
  [0,"BFC","INVERTNEXT"],
// 1 16 26.25 -36.5 14.5 0 -7 0 0 0 -.5 -.5 0 0 1-4cylo.dat
  [1,16,26.25,-36.5,14.5,0,-7,0,0,0,-.5,-.5,0,0, ldraw_lib__1_4cylo()],
// 1 16 26.25 -36.5 14.5 0 -1 0 0 0 -.5 -.5 0 0 1-4ring1.dat
  [1,16,26.25,-36.5,14.5,0,-1,0,0,0,-.5,-.5,0,0, ldraw_lib__1_4ring1()],
// 1 16 19.25 -36.5 14.5 0 1 0 0 0 -.5 -.5 0 0 1-4ring1.dat
  [1,16,19.25,-36.5,14.5,0,1,0,0,0,-.5,-.5,0,0, ldraw_lib__1_4ring1()],
// 1 16 22.75 -36.5 13.75 3.5 0 0 0 22 0 0 0 -.25 box4o8a.dat
  [1,16,22.75,-36.5,13.75,3.5,0,0,0,22,0,0,0,-.25, ldraw_lib__box4o8a()],
// 1 16 26.25 -14.5 13 0 -7 0 0 0 1 1 0 0 1-4cylo.dat
  [1,16,26.25,-14.5,13,0,-7,0,0,0,1,1,0,0, ldraw_lib__1_4cylo()],
// 0 BFC INVERTNEXT
  [0,"BFC","INVERTNEXT"],
// 1 16 26.25 -14.5 13 0 -7 0 0 0 .5 .5 0 0 1-4cylo.dat
  [1,16,26.25,-14.5,13,0,-7,0,0,0,.5,.5,0,0, ldraw_lib__1_4cylo()],
// 1 16 26.25 -14.5 13 0 -1 0 0 0 .5 .5 0 0 1-4ring1.dat
  [1,16,26.25,-14.5,13,0,-1,0,0,0,.5,.5,0,0, ldraw_lib__1_4ring1()],
// 1 16 19.25 -14.5 13 0 1 0 0 0 .5 .5 0 0 1-4ring1.dat
  [1,16,19.25,-14.5,13,0,1,0,0,0,.5,.5,0,0, ldraw_lib__1_4ring1()],
// 1 16 22.75 -13.75 13 3.5 0 0 0 0 -.25 0 -4 0 box4o8a.dat
  [1,16,22.75,-13.75,13,3.5,0,0,0,0,-.25,0,-4,0, ldraw_lib__box4o8a()],
// 1 16 26.25 -14.5 9 0 -7 0 1 0 0 0 0 -1 1-4cylo.dat
  [1,16,26.25,-14.5,9,0,-7,0,1,0,0,0,0,-1, ldraw_lib__1_4cylo()],
// 0 BFC INVERTNEXT
  [0,"BFC","INVERTNEXT"],
// 1 16 26.25 -14.5 9 0 -7 0 .5 0 0 0 0 -.5 1-4cylo.dat
  [1,16,26.25,-14.5,9,0,-7,0,.5,0,0,0,0,-.5, ldraw_lib__1_4cylo()],
// 1 16 26.25 -14.5 9 0 -1 0 .5 0 0 0 0 -.5 1-4ring1.dat
  [1,16,26.25,-14.5,9,0,-1,0,.5,0,0,0,0,-.5, ldraw_lib__1_4ring1()],
// 1 16 19.25 -14.5 9 0 1 0 .5 0 0 0 0 -.5 1-4ring1.dat
  [1,16,19.25,-14.5,9,0,1,0,.5,0,0,0,0,-.5, ldraw_lib__1_4ring1()],
// 1 16 22.75 -14.5 8.25 3.5 0 0 0 -3.5 0 0 0 .25 box4o8a.dat
  [1,16,22.75,-14.5,8.25,3.5,0,0,0,-3.5,0,0,0,.25, ldraw_lib__box4o8a()],
// 1 16 26.25 -18 7.5 0 -7 0 0 0 -1 1 0 0 1-8cylo.dat
  [1,16,26.25,-18,7.5,0,-7,0,0,0,-1,1,0,0, ldraw_lib__1_8cylo()],
// 0 BFC INVERTNEXT
  [0,"BFC","INVERTNEXT"],
// 1 16 26.25 -18 7.5 0 -7 0 0 0 -.5 .5 0 0 1-8cylo.dat
  [1,16,26.25,-18,7.5,0,-7,0,0,0,-.5,.5,0,0, ldraw_lib__1_8cylo()],
// 1 16 26.25 -18 7.5 0 -1 0 0 0 -.5 .5 0 0 1-8ring1.dat
  [1,16,26.25,-18,7.5,0,-1,0,0,0,-.5,.5,0,0, ldraw_lib__1_8ring1()],
// 1 16 19.25 -18 7.5 0 1 0 0 0 -.5 .5 0 0 1-8ring1.dat
  [1,16,19.25,-18,7.5,0,1,0,0,0,-.5,.5,0,0, ldraw_lib__1_8ring1()],
// 
// 1 16 22.75 -18.5303 8.0303 3.5 0 0 0 -3.85352 -.17678 0 -3.85352 .17678 box5-4a.dat
  [1,16,22.75,-18.5303,8.0303,3.5,0,0,0,-3.85352,-.17678,0,-3.85352,.17678, ldraw_lib__box5_4a()],
];
module ldraw_lib__u9575(step=0, col=false, unit=2/5, alt=false, line=0.2, solid=!$preview)
    makepoly(ldraw_lib__u9575(), step=step, col=col, unit=unit, alt=alt, line=line, solid=solid);
ldraw_lib__u9575(line=0.2);
